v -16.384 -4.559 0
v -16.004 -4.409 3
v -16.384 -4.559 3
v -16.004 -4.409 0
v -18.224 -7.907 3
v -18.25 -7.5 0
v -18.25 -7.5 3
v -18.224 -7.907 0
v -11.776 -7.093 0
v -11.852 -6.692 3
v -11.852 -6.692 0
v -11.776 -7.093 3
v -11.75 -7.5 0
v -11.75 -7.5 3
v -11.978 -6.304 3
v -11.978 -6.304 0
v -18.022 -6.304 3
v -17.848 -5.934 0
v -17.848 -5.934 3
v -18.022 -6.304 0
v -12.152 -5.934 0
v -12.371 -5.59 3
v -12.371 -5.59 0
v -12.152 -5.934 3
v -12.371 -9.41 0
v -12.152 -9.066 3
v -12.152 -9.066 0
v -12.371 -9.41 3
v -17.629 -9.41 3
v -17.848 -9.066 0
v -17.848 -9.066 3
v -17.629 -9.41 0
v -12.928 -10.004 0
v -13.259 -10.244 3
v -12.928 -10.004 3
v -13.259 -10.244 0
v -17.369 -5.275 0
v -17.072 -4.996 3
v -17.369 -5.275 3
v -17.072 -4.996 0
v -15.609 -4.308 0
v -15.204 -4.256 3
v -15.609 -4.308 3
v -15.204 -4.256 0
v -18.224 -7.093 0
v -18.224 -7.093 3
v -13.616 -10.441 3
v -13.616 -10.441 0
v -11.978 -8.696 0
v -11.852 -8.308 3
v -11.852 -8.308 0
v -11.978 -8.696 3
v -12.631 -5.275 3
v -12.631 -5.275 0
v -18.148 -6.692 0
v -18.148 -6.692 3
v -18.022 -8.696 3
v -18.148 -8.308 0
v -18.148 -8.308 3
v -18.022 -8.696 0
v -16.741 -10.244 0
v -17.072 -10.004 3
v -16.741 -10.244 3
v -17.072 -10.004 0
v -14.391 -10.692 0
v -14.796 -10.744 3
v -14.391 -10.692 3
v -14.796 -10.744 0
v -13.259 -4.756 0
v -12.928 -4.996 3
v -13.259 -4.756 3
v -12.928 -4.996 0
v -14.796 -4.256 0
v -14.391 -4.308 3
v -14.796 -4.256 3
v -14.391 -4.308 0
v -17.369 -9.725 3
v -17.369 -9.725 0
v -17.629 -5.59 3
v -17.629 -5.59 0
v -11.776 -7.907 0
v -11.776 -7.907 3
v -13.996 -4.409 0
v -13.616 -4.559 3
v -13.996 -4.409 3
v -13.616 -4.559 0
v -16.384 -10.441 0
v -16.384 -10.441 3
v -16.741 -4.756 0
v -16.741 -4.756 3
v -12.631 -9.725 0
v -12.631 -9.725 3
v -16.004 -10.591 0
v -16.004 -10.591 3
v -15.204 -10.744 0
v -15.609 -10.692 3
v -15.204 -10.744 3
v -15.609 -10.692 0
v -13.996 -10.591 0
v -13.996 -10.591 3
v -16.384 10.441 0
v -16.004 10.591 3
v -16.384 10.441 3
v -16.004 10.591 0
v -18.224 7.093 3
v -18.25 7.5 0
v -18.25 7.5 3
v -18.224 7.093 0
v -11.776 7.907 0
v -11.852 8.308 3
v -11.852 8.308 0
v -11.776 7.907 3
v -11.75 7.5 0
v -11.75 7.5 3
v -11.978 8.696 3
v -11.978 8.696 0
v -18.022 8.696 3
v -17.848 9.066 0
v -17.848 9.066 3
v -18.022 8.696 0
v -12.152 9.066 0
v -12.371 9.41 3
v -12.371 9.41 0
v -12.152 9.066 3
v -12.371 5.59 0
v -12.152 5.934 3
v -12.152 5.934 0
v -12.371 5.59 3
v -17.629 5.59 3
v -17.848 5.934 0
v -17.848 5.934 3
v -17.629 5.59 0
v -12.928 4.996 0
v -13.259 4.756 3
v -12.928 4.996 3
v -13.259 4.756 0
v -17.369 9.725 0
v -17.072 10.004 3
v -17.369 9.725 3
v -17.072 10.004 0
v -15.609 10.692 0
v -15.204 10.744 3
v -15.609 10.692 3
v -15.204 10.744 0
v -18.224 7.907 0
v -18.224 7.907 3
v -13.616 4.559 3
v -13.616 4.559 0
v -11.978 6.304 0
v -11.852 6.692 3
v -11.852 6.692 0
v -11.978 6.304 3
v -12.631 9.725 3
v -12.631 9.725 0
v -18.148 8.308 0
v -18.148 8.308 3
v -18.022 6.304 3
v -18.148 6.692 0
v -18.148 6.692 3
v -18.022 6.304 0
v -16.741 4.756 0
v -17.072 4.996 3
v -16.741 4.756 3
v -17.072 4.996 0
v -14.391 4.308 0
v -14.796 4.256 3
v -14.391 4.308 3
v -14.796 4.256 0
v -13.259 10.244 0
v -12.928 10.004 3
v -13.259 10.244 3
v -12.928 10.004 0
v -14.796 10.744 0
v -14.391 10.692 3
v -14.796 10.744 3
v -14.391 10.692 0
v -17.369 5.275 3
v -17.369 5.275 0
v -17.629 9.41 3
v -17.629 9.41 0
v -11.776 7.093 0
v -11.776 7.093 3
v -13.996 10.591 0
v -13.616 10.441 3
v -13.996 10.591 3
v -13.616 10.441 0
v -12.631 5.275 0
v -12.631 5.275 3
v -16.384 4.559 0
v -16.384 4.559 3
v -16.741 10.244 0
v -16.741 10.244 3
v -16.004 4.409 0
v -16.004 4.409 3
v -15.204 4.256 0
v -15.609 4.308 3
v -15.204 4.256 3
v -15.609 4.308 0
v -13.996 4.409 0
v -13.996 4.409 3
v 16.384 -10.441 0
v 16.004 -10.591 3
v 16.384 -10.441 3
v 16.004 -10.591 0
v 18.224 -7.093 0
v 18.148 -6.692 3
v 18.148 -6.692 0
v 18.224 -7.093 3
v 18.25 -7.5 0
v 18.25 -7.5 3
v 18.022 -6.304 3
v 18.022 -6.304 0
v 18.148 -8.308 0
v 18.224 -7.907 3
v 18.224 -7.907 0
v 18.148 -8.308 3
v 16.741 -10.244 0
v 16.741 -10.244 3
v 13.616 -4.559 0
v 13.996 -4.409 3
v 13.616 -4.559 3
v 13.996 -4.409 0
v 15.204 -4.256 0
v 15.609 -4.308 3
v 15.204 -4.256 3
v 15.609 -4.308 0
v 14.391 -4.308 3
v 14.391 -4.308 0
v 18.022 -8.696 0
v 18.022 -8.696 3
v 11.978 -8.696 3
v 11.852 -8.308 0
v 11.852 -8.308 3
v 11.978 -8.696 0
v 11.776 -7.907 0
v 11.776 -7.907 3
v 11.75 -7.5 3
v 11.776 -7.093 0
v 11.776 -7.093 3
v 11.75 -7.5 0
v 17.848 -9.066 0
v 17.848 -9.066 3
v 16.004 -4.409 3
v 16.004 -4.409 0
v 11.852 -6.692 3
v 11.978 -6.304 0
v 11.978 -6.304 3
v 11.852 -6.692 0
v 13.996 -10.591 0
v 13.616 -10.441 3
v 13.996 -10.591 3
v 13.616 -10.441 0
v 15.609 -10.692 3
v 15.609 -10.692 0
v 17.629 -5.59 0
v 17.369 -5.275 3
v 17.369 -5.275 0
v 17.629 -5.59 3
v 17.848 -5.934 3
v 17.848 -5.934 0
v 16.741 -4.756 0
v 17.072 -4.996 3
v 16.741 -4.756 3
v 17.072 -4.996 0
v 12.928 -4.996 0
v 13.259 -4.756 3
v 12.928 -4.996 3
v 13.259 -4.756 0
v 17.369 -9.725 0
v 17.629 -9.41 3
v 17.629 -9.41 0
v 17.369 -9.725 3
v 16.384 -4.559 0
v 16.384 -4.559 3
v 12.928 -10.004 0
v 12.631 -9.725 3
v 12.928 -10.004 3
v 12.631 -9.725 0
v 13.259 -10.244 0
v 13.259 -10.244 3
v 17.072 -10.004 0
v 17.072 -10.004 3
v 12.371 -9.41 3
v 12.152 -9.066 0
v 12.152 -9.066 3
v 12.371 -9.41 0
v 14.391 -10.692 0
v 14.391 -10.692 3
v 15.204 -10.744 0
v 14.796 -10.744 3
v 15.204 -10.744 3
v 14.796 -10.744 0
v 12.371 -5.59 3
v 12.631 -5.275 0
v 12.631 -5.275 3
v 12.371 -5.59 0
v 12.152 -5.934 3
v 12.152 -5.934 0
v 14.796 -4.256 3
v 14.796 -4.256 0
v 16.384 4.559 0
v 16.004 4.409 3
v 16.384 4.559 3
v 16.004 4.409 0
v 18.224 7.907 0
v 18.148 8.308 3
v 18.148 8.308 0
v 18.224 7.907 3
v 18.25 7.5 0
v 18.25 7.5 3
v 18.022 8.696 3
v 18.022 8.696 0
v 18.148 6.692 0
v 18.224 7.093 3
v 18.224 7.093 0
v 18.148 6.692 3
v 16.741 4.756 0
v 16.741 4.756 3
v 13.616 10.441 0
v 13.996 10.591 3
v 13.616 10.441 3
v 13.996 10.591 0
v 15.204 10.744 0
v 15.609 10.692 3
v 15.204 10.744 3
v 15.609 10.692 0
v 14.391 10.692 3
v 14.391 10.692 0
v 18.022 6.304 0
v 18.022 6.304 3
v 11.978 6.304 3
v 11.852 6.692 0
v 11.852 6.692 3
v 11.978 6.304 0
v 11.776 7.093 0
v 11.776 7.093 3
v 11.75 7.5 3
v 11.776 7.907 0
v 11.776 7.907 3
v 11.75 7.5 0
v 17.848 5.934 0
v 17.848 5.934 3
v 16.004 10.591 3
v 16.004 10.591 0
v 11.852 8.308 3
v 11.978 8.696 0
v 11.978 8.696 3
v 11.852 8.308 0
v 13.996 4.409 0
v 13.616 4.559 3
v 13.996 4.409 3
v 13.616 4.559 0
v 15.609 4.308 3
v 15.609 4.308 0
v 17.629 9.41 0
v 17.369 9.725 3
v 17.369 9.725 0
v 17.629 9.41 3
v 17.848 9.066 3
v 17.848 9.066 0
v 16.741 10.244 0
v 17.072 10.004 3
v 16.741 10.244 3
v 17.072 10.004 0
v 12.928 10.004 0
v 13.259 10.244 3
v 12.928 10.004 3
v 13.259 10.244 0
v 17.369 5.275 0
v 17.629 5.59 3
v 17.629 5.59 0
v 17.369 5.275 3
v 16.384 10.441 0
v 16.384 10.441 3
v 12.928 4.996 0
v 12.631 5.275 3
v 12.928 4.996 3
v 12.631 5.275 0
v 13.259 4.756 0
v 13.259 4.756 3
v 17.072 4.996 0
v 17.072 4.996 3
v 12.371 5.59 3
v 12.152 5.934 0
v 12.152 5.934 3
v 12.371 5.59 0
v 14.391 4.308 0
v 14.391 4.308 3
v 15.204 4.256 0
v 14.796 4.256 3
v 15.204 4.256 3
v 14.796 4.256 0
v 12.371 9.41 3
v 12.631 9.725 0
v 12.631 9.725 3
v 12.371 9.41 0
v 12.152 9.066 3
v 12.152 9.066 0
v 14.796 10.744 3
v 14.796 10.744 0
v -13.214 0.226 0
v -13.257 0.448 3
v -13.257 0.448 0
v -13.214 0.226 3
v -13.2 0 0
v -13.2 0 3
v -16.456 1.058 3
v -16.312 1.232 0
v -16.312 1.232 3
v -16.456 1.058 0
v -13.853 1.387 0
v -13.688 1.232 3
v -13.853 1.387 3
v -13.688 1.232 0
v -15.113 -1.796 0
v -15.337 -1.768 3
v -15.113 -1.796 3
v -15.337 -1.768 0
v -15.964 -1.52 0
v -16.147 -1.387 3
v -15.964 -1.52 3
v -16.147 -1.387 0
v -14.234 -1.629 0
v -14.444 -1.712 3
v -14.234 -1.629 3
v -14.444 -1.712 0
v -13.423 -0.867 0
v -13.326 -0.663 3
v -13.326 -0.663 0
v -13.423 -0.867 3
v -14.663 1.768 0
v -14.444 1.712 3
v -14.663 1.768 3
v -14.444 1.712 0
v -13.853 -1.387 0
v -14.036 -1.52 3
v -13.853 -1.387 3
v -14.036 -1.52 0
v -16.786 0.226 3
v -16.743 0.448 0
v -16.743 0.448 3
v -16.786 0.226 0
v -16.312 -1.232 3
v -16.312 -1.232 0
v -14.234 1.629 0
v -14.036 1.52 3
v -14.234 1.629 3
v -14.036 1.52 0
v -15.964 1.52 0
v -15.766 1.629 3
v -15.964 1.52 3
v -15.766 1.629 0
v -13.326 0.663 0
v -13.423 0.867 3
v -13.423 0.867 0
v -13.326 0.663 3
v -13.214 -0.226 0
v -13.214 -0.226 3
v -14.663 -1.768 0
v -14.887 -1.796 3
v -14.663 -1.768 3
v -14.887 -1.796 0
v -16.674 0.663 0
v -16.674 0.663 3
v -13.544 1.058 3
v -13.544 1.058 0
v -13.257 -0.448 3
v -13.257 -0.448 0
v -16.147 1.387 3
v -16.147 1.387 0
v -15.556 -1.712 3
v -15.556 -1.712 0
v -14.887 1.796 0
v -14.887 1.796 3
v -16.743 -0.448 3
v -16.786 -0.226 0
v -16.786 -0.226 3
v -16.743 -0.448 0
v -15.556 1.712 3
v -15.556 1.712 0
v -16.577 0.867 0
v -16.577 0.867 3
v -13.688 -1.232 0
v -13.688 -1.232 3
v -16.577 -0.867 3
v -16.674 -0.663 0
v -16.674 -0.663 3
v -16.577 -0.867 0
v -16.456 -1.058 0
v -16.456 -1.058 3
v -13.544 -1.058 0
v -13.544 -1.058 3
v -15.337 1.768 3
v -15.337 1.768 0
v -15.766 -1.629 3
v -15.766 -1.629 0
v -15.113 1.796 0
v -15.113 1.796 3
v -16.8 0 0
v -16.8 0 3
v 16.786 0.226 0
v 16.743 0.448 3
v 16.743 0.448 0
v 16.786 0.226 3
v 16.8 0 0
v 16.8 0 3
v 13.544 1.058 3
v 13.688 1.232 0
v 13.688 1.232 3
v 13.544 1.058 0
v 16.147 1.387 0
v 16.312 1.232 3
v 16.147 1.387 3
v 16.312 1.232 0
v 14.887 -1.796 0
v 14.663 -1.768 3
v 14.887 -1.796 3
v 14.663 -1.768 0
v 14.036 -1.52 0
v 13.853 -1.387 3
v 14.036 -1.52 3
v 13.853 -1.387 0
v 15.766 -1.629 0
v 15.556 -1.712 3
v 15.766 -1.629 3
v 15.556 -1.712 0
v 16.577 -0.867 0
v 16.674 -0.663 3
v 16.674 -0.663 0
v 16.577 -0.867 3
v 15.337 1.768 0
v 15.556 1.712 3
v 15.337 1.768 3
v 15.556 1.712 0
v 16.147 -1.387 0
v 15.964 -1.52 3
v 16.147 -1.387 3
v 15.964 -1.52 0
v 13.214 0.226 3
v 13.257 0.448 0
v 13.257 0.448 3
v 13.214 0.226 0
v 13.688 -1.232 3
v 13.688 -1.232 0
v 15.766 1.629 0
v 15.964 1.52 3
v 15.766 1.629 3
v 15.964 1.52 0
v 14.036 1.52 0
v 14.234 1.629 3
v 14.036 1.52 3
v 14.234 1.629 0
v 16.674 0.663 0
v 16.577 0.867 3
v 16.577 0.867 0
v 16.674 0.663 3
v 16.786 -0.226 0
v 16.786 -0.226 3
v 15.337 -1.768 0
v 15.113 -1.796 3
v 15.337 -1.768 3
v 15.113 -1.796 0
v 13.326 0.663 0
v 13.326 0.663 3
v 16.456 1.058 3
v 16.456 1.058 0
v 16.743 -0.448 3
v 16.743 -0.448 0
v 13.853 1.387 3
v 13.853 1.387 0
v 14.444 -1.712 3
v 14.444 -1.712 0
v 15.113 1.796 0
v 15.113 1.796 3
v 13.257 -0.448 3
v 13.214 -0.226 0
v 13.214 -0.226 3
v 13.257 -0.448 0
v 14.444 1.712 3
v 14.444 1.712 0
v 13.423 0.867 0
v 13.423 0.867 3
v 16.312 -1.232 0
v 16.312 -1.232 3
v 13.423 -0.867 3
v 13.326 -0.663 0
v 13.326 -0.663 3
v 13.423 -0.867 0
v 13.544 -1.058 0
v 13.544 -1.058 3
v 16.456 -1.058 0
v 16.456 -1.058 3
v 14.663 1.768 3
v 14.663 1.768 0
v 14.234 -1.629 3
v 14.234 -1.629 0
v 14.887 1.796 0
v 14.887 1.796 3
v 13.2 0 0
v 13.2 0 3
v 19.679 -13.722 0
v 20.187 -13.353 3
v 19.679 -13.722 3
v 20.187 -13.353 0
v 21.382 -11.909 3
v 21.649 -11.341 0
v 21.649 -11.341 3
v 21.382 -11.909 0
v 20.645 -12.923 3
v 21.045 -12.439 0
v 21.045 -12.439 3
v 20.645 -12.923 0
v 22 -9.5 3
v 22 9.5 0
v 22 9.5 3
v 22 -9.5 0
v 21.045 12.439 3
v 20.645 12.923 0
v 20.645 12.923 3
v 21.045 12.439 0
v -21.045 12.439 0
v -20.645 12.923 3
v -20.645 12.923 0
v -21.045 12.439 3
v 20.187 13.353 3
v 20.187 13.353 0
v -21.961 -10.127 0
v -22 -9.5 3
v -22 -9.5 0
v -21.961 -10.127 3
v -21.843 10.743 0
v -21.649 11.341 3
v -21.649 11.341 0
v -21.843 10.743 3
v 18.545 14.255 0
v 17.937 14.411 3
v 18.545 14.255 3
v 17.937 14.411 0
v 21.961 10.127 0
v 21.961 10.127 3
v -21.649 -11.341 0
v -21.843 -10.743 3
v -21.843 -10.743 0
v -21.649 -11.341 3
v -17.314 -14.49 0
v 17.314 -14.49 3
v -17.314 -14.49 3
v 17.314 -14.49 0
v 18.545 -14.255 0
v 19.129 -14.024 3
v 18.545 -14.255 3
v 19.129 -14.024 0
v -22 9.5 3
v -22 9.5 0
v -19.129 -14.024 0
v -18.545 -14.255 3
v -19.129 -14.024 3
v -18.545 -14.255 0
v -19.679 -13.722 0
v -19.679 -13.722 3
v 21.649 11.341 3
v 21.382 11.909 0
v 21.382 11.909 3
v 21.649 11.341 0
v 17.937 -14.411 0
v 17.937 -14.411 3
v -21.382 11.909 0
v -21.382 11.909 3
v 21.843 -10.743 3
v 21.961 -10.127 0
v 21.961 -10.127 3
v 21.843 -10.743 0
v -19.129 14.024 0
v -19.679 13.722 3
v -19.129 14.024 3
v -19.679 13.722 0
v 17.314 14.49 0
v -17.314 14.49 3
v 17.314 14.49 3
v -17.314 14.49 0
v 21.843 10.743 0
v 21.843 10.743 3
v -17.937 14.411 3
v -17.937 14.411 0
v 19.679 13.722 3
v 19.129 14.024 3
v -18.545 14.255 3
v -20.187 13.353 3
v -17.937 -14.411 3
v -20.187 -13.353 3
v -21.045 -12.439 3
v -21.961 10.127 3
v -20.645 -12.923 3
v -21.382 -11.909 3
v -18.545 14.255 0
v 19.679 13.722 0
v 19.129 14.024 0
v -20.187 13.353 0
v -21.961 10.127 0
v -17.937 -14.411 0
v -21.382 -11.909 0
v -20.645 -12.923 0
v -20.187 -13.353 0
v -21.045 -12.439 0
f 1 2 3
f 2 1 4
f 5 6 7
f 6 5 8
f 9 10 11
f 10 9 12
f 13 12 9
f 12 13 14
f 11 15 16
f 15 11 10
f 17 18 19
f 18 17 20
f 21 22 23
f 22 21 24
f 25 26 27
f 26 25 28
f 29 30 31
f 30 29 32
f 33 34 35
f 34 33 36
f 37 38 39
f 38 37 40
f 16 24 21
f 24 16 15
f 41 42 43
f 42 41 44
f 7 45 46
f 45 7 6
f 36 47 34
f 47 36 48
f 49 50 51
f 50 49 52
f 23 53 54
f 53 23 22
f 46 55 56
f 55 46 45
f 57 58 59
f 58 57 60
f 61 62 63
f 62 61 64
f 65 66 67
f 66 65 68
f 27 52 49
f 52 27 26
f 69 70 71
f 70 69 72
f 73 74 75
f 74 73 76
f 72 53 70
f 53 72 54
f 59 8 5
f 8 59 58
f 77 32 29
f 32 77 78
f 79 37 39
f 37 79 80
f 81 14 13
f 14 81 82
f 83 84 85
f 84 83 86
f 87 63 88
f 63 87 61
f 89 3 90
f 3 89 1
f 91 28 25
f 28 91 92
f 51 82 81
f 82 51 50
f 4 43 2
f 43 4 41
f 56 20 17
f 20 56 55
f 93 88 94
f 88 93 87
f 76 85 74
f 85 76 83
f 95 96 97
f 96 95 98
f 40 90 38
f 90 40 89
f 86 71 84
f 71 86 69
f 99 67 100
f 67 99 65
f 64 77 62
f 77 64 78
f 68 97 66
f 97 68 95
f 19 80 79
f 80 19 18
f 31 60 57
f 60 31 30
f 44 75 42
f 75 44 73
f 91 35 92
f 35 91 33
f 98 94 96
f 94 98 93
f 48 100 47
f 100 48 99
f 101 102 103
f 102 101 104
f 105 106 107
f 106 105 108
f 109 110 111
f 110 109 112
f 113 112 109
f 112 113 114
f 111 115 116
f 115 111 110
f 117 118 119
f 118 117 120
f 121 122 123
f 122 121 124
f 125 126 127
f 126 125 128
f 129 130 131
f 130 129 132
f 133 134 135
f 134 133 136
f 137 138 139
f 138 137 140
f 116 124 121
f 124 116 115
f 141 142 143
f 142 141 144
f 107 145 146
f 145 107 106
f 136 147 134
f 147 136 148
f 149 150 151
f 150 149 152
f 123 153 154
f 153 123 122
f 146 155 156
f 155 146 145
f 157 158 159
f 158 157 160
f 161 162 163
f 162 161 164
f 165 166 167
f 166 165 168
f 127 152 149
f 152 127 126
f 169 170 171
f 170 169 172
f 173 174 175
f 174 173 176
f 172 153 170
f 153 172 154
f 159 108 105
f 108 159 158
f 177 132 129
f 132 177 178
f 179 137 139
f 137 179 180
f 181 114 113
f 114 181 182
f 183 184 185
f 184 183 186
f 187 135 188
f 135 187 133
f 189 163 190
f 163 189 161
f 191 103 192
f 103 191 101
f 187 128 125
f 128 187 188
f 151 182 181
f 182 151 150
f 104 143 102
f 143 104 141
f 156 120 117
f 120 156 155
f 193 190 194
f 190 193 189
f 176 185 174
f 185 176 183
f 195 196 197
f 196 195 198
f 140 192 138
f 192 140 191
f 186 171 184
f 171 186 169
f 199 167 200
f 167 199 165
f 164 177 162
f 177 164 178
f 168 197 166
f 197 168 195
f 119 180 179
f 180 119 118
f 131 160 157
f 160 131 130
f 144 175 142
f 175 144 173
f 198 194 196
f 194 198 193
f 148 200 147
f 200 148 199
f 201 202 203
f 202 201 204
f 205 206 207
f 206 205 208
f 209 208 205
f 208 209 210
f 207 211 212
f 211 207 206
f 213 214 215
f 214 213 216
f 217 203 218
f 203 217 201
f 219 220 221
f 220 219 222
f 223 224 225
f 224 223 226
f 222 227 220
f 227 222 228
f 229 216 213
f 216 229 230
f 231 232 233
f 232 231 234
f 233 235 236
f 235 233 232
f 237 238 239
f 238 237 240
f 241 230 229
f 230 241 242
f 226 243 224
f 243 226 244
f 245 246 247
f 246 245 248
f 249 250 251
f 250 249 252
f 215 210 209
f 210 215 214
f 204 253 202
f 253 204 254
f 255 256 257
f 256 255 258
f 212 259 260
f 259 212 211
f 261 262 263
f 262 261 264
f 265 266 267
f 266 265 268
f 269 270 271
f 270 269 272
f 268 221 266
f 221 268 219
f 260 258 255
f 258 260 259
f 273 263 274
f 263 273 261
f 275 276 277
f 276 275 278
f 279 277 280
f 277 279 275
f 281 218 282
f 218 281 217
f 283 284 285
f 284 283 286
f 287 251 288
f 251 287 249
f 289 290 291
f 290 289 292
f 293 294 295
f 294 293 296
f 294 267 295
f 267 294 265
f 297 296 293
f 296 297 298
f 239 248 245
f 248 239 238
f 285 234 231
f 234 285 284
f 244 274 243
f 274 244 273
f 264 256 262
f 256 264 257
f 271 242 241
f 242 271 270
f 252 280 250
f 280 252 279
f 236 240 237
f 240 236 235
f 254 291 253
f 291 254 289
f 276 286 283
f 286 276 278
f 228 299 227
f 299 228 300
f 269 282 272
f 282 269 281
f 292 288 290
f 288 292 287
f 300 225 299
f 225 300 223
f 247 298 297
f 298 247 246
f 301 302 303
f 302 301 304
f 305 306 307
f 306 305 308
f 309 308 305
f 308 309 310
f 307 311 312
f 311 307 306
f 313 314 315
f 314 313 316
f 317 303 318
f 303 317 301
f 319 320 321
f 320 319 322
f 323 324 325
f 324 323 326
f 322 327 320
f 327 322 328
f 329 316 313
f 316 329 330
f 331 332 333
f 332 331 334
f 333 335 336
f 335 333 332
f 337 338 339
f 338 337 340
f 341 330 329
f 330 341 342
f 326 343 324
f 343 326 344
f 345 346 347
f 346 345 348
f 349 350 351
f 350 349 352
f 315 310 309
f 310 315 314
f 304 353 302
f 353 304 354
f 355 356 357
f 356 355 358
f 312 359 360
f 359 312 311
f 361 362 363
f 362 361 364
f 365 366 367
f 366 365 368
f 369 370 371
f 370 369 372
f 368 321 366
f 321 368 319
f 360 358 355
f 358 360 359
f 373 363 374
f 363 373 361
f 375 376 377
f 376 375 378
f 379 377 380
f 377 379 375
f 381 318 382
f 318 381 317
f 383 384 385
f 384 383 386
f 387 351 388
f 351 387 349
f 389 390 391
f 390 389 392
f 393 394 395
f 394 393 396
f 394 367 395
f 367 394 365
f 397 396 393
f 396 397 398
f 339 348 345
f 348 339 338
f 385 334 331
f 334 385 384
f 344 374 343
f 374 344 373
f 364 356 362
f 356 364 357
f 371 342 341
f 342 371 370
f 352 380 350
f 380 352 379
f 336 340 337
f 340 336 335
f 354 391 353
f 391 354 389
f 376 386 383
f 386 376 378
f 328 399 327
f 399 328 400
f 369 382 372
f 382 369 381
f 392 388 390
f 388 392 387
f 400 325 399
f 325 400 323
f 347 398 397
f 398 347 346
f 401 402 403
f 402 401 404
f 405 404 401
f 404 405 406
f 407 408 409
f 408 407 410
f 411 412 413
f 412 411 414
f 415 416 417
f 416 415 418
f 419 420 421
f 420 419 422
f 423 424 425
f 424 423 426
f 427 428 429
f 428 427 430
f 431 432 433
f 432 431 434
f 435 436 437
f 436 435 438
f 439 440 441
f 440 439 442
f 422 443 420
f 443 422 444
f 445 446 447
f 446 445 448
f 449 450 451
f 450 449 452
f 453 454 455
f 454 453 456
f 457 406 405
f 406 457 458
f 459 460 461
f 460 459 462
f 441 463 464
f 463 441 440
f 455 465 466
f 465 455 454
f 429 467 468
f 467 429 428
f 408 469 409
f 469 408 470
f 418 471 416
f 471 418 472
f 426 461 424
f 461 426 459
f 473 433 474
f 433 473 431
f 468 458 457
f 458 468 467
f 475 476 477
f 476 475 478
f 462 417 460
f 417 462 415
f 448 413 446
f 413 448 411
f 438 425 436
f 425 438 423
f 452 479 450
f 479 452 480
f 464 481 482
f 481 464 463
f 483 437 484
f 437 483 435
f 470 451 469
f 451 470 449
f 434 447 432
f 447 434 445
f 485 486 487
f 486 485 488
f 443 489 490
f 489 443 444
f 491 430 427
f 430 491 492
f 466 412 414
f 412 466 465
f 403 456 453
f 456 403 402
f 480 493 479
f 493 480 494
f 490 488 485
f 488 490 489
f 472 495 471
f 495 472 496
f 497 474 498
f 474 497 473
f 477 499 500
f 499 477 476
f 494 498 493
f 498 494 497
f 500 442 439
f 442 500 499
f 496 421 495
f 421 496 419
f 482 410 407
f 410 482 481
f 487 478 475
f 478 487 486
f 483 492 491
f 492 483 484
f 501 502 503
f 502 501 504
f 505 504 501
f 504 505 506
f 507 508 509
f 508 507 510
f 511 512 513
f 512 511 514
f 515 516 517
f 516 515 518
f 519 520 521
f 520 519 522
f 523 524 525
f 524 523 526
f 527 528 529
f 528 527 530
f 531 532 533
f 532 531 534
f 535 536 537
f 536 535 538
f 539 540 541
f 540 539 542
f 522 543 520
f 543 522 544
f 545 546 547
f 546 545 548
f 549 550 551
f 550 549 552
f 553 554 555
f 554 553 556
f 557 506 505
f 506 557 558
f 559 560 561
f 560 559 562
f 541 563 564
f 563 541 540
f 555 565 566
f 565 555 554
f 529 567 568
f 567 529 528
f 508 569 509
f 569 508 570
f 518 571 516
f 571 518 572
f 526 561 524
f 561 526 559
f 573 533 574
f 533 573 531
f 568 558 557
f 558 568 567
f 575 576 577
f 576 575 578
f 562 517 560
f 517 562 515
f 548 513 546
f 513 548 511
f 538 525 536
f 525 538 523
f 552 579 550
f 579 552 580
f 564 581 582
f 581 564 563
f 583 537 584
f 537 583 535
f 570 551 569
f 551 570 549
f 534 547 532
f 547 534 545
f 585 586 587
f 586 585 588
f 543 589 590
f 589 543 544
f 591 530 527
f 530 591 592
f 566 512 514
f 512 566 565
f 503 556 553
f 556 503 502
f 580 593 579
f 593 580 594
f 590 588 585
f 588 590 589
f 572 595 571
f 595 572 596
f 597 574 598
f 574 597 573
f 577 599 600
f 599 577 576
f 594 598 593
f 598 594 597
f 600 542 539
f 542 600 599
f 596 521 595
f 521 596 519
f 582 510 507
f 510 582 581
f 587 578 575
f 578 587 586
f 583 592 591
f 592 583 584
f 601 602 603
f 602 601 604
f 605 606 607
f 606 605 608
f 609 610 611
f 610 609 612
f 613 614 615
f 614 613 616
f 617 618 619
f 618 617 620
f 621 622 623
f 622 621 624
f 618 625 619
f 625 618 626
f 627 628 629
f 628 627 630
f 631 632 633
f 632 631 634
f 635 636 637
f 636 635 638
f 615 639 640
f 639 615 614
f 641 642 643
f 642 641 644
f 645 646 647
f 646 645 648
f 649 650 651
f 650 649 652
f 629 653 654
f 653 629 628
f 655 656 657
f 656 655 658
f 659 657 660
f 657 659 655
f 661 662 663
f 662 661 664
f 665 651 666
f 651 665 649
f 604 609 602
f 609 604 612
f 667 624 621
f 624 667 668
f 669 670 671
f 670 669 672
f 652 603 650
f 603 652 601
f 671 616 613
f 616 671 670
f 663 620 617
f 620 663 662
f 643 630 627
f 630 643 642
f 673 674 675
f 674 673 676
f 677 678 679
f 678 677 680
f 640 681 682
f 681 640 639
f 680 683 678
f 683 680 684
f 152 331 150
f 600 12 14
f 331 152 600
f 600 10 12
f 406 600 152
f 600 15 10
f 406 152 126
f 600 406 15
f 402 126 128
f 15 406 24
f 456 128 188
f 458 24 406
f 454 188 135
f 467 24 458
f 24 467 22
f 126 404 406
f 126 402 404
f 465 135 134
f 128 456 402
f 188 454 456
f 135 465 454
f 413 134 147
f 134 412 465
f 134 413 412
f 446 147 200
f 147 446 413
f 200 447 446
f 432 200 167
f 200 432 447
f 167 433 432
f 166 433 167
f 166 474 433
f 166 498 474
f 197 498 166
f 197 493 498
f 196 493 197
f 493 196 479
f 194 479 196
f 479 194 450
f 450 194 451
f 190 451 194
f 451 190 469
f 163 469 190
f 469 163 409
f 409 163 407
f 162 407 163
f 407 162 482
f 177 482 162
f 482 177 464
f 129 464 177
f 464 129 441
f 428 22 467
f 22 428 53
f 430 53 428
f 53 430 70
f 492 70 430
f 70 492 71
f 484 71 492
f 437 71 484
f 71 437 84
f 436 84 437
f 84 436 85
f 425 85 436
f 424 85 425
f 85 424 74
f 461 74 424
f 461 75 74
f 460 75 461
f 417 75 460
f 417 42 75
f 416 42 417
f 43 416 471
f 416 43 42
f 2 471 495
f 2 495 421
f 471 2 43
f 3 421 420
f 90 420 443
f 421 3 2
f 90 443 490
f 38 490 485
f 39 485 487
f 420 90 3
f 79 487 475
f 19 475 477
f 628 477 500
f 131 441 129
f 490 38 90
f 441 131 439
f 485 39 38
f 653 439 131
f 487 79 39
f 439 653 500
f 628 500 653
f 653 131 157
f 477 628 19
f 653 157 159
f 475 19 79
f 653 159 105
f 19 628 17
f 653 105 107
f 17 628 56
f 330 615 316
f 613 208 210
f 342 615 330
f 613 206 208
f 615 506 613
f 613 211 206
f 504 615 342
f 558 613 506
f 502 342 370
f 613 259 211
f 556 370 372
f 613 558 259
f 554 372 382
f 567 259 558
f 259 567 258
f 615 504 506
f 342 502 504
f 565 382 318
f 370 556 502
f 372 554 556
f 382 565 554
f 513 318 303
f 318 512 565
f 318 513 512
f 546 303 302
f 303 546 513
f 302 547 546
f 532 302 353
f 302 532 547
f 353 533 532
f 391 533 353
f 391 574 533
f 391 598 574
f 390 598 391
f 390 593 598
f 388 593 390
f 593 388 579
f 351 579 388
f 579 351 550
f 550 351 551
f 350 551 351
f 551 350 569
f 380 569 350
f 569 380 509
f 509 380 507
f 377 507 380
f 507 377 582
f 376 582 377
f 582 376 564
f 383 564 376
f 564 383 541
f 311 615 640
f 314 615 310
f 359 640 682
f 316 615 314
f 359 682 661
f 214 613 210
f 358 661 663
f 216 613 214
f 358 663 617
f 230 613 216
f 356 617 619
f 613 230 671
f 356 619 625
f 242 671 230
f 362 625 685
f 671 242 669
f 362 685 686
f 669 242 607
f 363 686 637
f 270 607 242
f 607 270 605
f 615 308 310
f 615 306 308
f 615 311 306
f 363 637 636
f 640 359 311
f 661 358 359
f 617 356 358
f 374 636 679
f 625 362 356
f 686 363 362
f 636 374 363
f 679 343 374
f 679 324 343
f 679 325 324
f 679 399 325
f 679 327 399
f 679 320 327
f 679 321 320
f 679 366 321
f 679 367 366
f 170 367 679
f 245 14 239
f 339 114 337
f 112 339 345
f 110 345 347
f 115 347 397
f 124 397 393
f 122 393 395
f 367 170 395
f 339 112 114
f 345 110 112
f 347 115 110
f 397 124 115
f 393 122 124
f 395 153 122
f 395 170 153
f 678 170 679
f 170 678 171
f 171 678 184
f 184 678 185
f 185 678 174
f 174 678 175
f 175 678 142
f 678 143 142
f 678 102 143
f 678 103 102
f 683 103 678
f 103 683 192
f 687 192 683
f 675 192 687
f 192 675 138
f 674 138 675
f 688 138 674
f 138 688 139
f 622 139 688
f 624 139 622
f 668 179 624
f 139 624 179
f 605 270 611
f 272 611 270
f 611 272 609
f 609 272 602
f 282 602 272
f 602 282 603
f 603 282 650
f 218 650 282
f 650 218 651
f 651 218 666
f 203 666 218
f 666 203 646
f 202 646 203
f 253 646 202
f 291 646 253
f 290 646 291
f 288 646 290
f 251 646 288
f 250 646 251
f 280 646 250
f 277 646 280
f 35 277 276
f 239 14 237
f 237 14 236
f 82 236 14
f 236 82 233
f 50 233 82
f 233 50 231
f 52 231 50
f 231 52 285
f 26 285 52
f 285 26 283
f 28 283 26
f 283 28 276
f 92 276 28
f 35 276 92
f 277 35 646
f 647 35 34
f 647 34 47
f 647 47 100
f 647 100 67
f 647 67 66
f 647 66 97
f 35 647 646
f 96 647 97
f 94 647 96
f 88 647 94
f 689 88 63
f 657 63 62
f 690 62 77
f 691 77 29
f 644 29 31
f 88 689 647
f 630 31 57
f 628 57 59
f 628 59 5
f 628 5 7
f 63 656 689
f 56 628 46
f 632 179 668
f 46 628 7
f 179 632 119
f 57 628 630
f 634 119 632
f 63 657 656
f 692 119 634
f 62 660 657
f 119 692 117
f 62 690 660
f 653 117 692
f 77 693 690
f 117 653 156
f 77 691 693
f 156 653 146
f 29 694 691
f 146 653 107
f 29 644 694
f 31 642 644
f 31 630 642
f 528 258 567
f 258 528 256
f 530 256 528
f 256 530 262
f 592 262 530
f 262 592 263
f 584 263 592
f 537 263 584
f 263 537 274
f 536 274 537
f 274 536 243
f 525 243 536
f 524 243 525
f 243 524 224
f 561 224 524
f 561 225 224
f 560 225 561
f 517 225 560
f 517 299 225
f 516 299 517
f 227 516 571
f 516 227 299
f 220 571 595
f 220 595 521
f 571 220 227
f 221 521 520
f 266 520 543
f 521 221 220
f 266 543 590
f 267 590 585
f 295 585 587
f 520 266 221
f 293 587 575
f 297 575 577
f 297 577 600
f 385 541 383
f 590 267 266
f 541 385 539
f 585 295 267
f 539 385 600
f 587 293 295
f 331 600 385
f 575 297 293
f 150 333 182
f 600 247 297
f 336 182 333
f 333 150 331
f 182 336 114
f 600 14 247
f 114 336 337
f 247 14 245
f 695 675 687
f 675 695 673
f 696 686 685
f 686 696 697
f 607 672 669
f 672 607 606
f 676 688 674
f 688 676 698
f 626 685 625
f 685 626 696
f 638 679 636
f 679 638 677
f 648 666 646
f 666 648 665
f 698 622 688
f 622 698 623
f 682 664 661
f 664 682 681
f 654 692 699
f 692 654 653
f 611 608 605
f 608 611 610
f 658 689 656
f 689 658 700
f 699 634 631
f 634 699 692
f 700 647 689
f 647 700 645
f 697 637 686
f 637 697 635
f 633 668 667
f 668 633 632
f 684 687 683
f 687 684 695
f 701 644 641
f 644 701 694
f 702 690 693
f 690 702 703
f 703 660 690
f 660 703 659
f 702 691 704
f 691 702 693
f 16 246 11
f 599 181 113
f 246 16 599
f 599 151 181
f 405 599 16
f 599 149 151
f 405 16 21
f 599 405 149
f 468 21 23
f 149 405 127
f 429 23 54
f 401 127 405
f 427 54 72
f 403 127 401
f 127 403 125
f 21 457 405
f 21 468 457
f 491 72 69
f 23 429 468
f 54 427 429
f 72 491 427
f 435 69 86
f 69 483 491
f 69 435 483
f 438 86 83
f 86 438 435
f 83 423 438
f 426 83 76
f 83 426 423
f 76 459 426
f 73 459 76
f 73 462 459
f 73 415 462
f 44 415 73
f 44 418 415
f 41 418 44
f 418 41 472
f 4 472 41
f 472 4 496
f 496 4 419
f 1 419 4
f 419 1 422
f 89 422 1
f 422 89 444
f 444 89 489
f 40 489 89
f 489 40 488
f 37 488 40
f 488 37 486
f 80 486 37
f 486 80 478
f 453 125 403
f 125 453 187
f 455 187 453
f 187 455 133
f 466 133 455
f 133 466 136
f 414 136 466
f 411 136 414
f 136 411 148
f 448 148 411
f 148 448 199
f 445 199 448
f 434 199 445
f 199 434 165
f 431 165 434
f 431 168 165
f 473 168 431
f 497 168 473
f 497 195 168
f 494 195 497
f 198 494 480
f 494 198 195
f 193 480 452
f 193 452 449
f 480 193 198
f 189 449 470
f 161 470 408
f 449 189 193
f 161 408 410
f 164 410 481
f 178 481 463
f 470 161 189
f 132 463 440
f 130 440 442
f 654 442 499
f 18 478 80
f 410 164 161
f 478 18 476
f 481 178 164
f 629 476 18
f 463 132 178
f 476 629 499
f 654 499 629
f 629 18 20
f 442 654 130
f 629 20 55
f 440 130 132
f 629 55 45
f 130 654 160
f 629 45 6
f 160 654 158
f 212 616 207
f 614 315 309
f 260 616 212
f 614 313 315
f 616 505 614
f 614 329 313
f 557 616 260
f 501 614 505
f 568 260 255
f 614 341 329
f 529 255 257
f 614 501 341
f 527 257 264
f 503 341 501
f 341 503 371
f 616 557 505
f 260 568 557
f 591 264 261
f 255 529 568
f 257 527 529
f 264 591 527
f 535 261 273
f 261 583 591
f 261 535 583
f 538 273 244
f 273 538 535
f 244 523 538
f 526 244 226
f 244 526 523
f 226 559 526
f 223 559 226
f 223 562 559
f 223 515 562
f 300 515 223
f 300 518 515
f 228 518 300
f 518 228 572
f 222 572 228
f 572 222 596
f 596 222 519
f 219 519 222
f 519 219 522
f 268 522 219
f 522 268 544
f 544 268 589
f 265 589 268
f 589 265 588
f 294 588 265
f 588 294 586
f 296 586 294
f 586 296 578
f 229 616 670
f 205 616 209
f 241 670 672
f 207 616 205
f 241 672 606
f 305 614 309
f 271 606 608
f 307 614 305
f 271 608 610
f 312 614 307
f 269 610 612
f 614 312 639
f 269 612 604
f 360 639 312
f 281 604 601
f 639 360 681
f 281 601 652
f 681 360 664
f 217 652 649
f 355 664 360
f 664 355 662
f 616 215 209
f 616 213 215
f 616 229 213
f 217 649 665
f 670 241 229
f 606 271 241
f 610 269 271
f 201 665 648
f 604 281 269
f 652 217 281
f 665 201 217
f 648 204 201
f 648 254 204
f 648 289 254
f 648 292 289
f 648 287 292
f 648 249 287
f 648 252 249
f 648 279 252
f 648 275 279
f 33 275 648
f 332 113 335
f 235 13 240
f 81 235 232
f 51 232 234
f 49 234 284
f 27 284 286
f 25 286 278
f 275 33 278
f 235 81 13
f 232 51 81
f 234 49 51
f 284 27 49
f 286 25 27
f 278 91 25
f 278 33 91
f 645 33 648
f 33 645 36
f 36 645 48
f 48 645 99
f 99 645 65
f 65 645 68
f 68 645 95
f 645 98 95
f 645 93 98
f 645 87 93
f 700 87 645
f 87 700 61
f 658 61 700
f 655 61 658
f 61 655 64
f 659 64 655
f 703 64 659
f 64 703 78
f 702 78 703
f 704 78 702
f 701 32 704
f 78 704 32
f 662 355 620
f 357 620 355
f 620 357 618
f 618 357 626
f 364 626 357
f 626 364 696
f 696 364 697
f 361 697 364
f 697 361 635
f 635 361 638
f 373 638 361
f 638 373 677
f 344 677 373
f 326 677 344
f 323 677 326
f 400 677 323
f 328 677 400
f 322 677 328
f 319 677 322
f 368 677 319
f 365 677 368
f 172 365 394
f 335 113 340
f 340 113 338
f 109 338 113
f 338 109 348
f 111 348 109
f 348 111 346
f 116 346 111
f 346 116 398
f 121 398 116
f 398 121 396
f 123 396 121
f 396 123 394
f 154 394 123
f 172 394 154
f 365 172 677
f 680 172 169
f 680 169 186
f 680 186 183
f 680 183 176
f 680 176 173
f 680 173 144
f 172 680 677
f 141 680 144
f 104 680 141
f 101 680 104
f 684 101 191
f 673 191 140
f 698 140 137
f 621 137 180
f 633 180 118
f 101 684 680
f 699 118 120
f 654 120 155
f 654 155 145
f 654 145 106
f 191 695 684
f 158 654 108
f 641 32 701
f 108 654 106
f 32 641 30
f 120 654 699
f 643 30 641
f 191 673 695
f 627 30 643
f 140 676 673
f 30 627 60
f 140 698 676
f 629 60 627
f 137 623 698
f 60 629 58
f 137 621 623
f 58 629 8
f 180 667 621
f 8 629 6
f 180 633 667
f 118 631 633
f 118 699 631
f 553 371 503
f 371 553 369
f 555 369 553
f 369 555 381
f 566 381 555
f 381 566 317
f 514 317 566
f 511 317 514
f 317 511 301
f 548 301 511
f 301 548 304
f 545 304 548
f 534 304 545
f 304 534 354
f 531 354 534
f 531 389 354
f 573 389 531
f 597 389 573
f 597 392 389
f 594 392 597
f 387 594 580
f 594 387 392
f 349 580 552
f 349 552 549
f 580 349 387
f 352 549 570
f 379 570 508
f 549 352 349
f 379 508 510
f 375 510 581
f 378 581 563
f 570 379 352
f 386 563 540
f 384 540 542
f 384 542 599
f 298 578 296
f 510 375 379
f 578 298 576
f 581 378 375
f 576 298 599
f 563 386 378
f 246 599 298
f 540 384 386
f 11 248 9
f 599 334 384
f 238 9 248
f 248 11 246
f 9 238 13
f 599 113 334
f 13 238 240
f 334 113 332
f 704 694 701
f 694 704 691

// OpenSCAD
$fn = 50;


difference() {
	union() {
		hull() {
			translate(v = [-17.0000000000, 9.5000000000, 0]) {
				cylinder(h = 3, r = 5);
			}
			translate(v = [17.0000000000, 9.5000000000, 0]) {
				cylinder(h = 3, r = 5);
			}
			translate(v = [-17.0000000000, -9.5000000000, 0]) {
				cylinder(h = 3, r = 5);
			}
			translate(v = [17.0000000000, -9.5000000000, 0]) {
				cylinder(h = 3, r = 5);
			}
		}
	}
	union() {
		translate(v = [-15.0000000000, -7.5000000000, -100.0000000000]) {
			cylinder(h = 200, r = 3.2500000000);
		}
		translate(v = [-15.0000000000, 7.5000000000, -100.0000000000]) {
			cylinder(h = 200, r = 3.2500000000);
		}
		translate(v = [15.0000000000, -7.5000000000, -100.0000000000]) {
			cylinder(h = 200, r = 3.2500000000);
		}
		translate(v = [15.0000000000, 7.5000000000, -100.0000000000]) {
			cylinder(h = 200, r = 3.2500000000);
		}
		translate(v = [15.0000000000, -7.5000000000, -100.0000000000]) {
			cylinder(h = 200, r = 3.2500000000);
		}
		translate(v = [15.0000000000, 7.5000000000, -100.0000000000]) {
			cylinder(h = 200, r = 3.2500000000);
		}
		translate(v = [-15.0000000000, -7.5000000000, -100.0000000000]) {
			cylinder(h = 200, r = 1.8000000000);
		}
		translate(v = [-15.0000000000, 0.0000000000, -100.0000000000]) {
			cylinder(h = 200, r = 1.8000000000);
		}
		translate(v = [-15.0000000000, 7.5000000000, -100.0000000000]) {
			cylinder(h = 200, r = 1.8000000000);
		}
		translate(v = [15.0000000000, -7.5000000000, -100.0000000000]) {
			cylinder(h = 200, r = 1.8000000000);
		}
		translate(v = [15.0000000000, 0.0000000000, -100.0000000000]) {
			cylinder(h = 200, r = 1.8000000000);
		}
		translate(v = [15.0000000000, 7.5000000000, -100.0000000000]) {
			cylinder(h = 200, r = 1.8000000000);
		}
		translate(v = [-15.0000000000, -7.5000000000, -100.0000000000]) {
			cylinder(h = 200, r = 1.8000000000);
		}
		translate(v = [-15.0000000000, 0.0000000000, -100.0000000000]) {
			cylinder(h = 200, r = 1.8000000000);
		}
		translate(v = [-15.0000000000, 7.5000000000, -100.0000000000]) {
			cylinder(h = 200, r = 1.8000000000);
		}
		translate(v = [15.0000000000, -7.5000000000, -100.0000000000]) {
			cylinder(h = 200, r = 1.8000000000);
		}
		translate(v = [15.0000000000, 0.0000000000, -100.0000000000]) {
			cylinder(h = 200, r = 1.8000000000);
		}
		translate(v = [15.0000000000, 7.5000000000, -100.0000000000]) {
			cylinder(h = 200, r = 1.8000000000);
		}
		translate(v = [-15.0000000000, -7.5000000000, -100.0000000000]) {
			cylinder(h = 200, r = 1.8000000000);
		}
		translate(v = [-15.0000000000, 0.0000000000, -100.0000000000]) {
			cylinder(h = 200, r = 1.8000000000);
		}
		translate(v = [-15.0000000000, 7.5000000000, -100.0000000000]) {
			cylinder(h = 200, r = 1.8000000000);
		}
		translate(v = [15.0000000000, -7.5000000000, -100.0000000000]) {
			cylinder(h = 200, r = 1.8000000000);
		}
		translate(v = [15.0000000000, 0.0000000000, -100.0000000000]) {
			cylinder(h = 200, r = 1.8000000000);
		}
		translate(v = [15.0000000000, 7.5000000000, -100.0000000000]) {
			cylinder(h = 200, r = 1.8000000000);
		}
	}
}
